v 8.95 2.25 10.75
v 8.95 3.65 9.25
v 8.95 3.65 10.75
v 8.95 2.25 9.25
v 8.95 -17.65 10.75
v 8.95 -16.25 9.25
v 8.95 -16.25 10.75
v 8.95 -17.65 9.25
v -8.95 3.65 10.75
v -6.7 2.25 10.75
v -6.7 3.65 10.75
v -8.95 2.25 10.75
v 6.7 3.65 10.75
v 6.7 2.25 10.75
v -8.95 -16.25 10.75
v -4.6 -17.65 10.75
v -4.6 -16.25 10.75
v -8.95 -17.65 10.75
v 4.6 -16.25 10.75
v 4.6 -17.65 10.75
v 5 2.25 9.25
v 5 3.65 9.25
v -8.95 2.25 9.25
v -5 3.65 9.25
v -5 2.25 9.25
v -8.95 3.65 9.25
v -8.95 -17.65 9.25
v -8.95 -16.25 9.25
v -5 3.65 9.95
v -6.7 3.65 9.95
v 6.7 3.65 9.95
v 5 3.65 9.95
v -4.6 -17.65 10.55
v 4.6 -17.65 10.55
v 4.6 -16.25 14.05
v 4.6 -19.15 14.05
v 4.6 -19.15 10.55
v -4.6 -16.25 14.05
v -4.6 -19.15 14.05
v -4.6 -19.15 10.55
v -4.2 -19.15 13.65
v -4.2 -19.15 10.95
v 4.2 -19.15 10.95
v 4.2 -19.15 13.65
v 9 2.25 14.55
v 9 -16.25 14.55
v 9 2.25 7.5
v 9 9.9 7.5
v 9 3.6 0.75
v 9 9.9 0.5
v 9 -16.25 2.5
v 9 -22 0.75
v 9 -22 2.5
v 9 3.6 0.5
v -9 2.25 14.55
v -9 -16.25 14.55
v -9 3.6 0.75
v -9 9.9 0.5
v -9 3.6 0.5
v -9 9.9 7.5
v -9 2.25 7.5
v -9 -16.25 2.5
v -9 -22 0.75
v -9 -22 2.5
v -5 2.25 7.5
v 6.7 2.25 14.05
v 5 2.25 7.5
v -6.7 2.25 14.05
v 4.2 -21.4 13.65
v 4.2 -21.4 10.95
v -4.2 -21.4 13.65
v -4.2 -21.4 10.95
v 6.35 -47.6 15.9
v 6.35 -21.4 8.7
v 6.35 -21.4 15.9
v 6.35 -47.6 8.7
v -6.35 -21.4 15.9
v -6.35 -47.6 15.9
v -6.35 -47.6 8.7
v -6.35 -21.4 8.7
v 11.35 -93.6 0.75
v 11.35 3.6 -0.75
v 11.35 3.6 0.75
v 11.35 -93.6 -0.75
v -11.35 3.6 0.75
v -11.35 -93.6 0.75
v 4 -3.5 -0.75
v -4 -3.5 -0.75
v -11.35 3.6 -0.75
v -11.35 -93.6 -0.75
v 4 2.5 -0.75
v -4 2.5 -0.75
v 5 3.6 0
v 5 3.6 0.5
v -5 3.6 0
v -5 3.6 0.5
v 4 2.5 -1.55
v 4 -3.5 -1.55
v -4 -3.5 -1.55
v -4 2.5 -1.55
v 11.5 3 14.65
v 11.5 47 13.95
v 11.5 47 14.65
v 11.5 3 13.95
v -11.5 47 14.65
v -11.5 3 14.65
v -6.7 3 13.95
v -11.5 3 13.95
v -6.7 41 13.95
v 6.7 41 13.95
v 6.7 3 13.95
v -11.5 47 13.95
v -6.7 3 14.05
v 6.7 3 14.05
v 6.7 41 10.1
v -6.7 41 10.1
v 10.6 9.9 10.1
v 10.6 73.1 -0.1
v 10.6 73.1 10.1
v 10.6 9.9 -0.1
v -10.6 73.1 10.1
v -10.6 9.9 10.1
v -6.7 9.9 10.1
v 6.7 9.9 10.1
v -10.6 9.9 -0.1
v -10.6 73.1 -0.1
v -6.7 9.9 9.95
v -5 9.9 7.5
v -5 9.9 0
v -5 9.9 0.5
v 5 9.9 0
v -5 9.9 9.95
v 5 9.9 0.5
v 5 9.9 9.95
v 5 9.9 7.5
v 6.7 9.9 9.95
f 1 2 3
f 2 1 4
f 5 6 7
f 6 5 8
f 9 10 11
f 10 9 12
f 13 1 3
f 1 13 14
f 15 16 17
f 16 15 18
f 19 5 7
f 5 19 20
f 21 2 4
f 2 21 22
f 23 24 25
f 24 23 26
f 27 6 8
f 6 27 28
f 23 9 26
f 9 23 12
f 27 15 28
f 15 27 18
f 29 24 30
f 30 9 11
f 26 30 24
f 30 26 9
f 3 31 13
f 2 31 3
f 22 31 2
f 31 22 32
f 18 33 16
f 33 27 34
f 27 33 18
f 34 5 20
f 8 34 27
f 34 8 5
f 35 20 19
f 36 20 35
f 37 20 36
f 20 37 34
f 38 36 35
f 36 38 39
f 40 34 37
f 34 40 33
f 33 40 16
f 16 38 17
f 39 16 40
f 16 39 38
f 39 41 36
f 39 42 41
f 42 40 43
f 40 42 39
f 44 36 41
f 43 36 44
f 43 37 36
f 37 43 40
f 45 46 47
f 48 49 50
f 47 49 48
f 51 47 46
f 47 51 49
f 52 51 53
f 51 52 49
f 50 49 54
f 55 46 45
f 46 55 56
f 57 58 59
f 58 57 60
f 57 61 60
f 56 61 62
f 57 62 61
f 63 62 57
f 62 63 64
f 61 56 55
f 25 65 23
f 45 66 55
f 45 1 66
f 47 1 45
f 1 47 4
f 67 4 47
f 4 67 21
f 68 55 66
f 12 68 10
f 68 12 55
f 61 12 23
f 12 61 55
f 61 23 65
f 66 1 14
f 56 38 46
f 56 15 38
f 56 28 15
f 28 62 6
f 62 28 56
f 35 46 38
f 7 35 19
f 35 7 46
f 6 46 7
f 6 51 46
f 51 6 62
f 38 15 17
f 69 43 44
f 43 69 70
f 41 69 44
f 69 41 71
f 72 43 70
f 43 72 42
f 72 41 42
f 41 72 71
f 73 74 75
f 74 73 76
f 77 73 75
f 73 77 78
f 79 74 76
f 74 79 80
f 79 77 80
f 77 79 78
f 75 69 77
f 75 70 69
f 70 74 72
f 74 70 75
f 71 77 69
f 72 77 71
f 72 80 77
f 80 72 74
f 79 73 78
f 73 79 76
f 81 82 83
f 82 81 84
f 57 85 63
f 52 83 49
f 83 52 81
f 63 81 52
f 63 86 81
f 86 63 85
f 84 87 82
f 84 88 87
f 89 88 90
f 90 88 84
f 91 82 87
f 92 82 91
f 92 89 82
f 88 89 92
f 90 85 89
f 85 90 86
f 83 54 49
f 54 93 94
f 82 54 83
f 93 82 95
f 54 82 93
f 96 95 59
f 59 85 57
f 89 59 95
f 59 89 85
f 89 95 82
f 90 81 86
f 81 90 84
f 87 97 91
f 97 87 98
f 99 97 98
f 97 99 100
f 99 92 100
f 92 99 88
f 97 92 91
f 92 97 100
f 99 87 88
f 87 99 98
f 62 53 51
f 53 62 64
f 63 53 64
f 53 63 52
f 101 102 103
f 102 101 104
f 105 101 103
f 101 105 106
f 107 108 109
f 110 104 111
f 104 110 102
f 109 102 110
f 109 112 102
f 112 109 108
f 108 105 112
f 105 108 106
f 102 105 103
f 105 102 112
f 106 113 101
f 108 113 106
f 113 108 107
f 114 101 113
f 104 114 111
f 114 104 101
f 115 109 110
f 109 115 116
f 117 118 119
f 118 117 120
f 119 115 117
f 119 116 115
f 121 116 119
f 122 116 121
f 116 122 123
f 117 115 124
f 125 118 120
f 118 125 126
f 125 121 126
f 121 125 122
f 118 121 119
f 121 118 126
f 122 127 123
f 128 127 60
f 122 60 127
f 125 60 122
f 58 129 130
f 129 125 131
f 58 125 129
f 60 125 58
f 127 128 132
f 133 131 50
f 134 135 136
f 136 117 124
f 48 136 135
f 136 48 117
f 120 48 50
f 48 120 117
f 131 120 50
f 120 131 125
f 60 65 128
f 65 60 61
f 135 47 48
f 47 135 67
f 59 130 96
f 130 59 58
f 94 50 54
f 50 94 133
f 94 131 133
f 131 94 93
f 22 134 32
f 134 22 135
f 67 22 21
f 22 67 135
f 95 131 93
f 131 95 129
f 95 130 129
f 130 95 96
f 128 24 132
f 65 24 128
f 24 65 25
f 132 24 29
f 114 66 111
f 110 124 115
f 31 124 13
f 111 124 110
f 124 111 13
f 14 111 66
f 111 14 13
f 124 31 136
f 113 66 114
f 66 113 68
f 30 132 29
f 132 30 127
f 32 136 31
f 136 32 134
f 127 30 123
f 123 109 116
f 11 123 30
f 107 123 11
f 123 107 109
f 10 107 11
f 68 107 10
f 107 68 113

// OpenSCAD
// file: sensor.scad
use <MCAD/boxes.scad>

//$fn=100;

// large battery 1200mAh : 63
// small battery  600mAh : 38
module battery(length, tol=0) {
    cube([21+tol,length+tol,10+tol],center=true);
}

function inc(arr,tol) = [arr[0]+tol,arr[1]+tol,arr[2]+tol];
function incA(arr,tol) = [arr[0]+tol[0],arr[1]+tol[1],arr[2]+tol[2]];

module esp32(tol=0) {
    pcb=[17.7,21.1,1.3];
    usb=[9,7.3,3.3];
    chip=[13,14,2.1];
    resistors=[17,18,3.6];

    union() {
      // PCB
      cube(inc(pcb, tol), center=true);    
      // USB
      translate([0,-pcb[1]/2+usb[1]/2-1.5,usb[2]/2+pcb[2]/2])
       cube(inc(usb, tol), center=true);    
      // chips
      translate([0,+3.5,chip[2]/2+pcb[2]/2])
       cube(chip, center=true);
      // place for resistors (voltage and battery cables)
      translate([0,0,-resistors[2]/2-pcb[2]/2])
       cube(inc(resistors, tol), center=true);
      // BLE antenna connector
      translate([0,pcb[1]/2,pcb[2]/2+1.5])
       cube(inc([5,5,3], tol), center=true);


    }
}

module antenna(tol=[0,0,0]) {
    union(){        
     cube(incA([22,42,0.5], tol),center=true);
     translate([0,0,-1])        
      cube(incA([10,30,2], tol),center=true);
    }
}

module sensor(tol=0, do_hole=true) {
    pcb=[22.5,97,1.3];
    union() {
      difference() {
        cube(inc(pcb, tol), center=true);    
        if (do_hole) {
          translate([+pcb[0]/2,pcb[1]/2-20.5,0])
            cylinder(6,r=4/2,center=true);
          translate([-pcb[0]/2,pcb[1]/2-20.5,0])
            cylinder(6,r=4/2,center=true);
        }
      }
      // limit line
      translate([0,pcb[1]/2-31,0])
        cube([pcb[0]-8,1,pcb[2]+0.2],center=true);
      // soudures
      translate([0,pcb[1]/2-4,-pcb[2]/2+0.1])
        cube([8,6,2],center=true);
      // chip
      translate([0,pcb[1]/2-13,1.5])
        cube([17,25,2],center=true);
    }
}


module cable(tol=0) {
   translate([0,-4,0])
     cube(inc([8.2,8,2.5],tol),center=true);// usb
   translate([0,-18.9,0])
     cube(inc([12.5,30-4,7],tol),center=true); // plug
}

module model(batt_length, tol=0) {
  translate([0,-45,0])
    sensor(tol);  
    
  translate([0,25,14.3])
    antenna([tol,tol,tol]);    
  translate([0,10+batt_length/2,5])
    battery(batt_length,tol);

  translate([0,0,2]) {
    translate([0,-7,8])
      rotate([0,0,0])
        esp32(tol);
    translate([0,-15.6,10.3])
      cable(tol);
  }
}


batS=38;
batL=63;
model(batS);
// main file
use <sensor.scad>

// ================
// holes
// ================
module hole_ESP() {
   translate([0,0,2]) {
    union(){
     translate([0,-7,6.5])
       rotate([0,0,0]) {
        cube([18,18.5,12.1],center=true);
        //translate([0,0.3,0])
        // cube([16,21.5,12],center=true);
        translate([0,0,1.5])
         esp32(0.2);
       };
      translate([0,-15.6,10.3])
      cable(0.2);
    }        
  }
}

module hole_model(batt_length) {  
  // esp+cable
  hole_ESP();
  // sensor
  translate([0,-45,0])
    sensor(0.2, false);  
  // hole esp32-sensor
  //translate([0,0,25])
  //  cube([10,20,10],center=true);
  // battery
  translate([0,10+batt_length/2,5])
    battery(batt_length,0.2);    
  // hole : battery-sensor_esp32
  translate([0,6,4])
    cube([18,10,7],center=true);
  // hole : sensor electronic to align to other holes
  translate([0,-7,1.5])
    cube([18,30,2],center=true);
  // hole : cables aligned to other holes
  translate([0,7,5])
    cube([10,15,10],center=true);


  // antenna
  translate([0,25,14.3])
    antenna([1,2,0.2]);        
  // hole antenna-*
  translate([0,21,12])
    cube([13.4,40,4.1],center=true);
}

color("#f0a090",0.5)
  hole_model(63);
color("#a09090",0.5)
  model(63);
